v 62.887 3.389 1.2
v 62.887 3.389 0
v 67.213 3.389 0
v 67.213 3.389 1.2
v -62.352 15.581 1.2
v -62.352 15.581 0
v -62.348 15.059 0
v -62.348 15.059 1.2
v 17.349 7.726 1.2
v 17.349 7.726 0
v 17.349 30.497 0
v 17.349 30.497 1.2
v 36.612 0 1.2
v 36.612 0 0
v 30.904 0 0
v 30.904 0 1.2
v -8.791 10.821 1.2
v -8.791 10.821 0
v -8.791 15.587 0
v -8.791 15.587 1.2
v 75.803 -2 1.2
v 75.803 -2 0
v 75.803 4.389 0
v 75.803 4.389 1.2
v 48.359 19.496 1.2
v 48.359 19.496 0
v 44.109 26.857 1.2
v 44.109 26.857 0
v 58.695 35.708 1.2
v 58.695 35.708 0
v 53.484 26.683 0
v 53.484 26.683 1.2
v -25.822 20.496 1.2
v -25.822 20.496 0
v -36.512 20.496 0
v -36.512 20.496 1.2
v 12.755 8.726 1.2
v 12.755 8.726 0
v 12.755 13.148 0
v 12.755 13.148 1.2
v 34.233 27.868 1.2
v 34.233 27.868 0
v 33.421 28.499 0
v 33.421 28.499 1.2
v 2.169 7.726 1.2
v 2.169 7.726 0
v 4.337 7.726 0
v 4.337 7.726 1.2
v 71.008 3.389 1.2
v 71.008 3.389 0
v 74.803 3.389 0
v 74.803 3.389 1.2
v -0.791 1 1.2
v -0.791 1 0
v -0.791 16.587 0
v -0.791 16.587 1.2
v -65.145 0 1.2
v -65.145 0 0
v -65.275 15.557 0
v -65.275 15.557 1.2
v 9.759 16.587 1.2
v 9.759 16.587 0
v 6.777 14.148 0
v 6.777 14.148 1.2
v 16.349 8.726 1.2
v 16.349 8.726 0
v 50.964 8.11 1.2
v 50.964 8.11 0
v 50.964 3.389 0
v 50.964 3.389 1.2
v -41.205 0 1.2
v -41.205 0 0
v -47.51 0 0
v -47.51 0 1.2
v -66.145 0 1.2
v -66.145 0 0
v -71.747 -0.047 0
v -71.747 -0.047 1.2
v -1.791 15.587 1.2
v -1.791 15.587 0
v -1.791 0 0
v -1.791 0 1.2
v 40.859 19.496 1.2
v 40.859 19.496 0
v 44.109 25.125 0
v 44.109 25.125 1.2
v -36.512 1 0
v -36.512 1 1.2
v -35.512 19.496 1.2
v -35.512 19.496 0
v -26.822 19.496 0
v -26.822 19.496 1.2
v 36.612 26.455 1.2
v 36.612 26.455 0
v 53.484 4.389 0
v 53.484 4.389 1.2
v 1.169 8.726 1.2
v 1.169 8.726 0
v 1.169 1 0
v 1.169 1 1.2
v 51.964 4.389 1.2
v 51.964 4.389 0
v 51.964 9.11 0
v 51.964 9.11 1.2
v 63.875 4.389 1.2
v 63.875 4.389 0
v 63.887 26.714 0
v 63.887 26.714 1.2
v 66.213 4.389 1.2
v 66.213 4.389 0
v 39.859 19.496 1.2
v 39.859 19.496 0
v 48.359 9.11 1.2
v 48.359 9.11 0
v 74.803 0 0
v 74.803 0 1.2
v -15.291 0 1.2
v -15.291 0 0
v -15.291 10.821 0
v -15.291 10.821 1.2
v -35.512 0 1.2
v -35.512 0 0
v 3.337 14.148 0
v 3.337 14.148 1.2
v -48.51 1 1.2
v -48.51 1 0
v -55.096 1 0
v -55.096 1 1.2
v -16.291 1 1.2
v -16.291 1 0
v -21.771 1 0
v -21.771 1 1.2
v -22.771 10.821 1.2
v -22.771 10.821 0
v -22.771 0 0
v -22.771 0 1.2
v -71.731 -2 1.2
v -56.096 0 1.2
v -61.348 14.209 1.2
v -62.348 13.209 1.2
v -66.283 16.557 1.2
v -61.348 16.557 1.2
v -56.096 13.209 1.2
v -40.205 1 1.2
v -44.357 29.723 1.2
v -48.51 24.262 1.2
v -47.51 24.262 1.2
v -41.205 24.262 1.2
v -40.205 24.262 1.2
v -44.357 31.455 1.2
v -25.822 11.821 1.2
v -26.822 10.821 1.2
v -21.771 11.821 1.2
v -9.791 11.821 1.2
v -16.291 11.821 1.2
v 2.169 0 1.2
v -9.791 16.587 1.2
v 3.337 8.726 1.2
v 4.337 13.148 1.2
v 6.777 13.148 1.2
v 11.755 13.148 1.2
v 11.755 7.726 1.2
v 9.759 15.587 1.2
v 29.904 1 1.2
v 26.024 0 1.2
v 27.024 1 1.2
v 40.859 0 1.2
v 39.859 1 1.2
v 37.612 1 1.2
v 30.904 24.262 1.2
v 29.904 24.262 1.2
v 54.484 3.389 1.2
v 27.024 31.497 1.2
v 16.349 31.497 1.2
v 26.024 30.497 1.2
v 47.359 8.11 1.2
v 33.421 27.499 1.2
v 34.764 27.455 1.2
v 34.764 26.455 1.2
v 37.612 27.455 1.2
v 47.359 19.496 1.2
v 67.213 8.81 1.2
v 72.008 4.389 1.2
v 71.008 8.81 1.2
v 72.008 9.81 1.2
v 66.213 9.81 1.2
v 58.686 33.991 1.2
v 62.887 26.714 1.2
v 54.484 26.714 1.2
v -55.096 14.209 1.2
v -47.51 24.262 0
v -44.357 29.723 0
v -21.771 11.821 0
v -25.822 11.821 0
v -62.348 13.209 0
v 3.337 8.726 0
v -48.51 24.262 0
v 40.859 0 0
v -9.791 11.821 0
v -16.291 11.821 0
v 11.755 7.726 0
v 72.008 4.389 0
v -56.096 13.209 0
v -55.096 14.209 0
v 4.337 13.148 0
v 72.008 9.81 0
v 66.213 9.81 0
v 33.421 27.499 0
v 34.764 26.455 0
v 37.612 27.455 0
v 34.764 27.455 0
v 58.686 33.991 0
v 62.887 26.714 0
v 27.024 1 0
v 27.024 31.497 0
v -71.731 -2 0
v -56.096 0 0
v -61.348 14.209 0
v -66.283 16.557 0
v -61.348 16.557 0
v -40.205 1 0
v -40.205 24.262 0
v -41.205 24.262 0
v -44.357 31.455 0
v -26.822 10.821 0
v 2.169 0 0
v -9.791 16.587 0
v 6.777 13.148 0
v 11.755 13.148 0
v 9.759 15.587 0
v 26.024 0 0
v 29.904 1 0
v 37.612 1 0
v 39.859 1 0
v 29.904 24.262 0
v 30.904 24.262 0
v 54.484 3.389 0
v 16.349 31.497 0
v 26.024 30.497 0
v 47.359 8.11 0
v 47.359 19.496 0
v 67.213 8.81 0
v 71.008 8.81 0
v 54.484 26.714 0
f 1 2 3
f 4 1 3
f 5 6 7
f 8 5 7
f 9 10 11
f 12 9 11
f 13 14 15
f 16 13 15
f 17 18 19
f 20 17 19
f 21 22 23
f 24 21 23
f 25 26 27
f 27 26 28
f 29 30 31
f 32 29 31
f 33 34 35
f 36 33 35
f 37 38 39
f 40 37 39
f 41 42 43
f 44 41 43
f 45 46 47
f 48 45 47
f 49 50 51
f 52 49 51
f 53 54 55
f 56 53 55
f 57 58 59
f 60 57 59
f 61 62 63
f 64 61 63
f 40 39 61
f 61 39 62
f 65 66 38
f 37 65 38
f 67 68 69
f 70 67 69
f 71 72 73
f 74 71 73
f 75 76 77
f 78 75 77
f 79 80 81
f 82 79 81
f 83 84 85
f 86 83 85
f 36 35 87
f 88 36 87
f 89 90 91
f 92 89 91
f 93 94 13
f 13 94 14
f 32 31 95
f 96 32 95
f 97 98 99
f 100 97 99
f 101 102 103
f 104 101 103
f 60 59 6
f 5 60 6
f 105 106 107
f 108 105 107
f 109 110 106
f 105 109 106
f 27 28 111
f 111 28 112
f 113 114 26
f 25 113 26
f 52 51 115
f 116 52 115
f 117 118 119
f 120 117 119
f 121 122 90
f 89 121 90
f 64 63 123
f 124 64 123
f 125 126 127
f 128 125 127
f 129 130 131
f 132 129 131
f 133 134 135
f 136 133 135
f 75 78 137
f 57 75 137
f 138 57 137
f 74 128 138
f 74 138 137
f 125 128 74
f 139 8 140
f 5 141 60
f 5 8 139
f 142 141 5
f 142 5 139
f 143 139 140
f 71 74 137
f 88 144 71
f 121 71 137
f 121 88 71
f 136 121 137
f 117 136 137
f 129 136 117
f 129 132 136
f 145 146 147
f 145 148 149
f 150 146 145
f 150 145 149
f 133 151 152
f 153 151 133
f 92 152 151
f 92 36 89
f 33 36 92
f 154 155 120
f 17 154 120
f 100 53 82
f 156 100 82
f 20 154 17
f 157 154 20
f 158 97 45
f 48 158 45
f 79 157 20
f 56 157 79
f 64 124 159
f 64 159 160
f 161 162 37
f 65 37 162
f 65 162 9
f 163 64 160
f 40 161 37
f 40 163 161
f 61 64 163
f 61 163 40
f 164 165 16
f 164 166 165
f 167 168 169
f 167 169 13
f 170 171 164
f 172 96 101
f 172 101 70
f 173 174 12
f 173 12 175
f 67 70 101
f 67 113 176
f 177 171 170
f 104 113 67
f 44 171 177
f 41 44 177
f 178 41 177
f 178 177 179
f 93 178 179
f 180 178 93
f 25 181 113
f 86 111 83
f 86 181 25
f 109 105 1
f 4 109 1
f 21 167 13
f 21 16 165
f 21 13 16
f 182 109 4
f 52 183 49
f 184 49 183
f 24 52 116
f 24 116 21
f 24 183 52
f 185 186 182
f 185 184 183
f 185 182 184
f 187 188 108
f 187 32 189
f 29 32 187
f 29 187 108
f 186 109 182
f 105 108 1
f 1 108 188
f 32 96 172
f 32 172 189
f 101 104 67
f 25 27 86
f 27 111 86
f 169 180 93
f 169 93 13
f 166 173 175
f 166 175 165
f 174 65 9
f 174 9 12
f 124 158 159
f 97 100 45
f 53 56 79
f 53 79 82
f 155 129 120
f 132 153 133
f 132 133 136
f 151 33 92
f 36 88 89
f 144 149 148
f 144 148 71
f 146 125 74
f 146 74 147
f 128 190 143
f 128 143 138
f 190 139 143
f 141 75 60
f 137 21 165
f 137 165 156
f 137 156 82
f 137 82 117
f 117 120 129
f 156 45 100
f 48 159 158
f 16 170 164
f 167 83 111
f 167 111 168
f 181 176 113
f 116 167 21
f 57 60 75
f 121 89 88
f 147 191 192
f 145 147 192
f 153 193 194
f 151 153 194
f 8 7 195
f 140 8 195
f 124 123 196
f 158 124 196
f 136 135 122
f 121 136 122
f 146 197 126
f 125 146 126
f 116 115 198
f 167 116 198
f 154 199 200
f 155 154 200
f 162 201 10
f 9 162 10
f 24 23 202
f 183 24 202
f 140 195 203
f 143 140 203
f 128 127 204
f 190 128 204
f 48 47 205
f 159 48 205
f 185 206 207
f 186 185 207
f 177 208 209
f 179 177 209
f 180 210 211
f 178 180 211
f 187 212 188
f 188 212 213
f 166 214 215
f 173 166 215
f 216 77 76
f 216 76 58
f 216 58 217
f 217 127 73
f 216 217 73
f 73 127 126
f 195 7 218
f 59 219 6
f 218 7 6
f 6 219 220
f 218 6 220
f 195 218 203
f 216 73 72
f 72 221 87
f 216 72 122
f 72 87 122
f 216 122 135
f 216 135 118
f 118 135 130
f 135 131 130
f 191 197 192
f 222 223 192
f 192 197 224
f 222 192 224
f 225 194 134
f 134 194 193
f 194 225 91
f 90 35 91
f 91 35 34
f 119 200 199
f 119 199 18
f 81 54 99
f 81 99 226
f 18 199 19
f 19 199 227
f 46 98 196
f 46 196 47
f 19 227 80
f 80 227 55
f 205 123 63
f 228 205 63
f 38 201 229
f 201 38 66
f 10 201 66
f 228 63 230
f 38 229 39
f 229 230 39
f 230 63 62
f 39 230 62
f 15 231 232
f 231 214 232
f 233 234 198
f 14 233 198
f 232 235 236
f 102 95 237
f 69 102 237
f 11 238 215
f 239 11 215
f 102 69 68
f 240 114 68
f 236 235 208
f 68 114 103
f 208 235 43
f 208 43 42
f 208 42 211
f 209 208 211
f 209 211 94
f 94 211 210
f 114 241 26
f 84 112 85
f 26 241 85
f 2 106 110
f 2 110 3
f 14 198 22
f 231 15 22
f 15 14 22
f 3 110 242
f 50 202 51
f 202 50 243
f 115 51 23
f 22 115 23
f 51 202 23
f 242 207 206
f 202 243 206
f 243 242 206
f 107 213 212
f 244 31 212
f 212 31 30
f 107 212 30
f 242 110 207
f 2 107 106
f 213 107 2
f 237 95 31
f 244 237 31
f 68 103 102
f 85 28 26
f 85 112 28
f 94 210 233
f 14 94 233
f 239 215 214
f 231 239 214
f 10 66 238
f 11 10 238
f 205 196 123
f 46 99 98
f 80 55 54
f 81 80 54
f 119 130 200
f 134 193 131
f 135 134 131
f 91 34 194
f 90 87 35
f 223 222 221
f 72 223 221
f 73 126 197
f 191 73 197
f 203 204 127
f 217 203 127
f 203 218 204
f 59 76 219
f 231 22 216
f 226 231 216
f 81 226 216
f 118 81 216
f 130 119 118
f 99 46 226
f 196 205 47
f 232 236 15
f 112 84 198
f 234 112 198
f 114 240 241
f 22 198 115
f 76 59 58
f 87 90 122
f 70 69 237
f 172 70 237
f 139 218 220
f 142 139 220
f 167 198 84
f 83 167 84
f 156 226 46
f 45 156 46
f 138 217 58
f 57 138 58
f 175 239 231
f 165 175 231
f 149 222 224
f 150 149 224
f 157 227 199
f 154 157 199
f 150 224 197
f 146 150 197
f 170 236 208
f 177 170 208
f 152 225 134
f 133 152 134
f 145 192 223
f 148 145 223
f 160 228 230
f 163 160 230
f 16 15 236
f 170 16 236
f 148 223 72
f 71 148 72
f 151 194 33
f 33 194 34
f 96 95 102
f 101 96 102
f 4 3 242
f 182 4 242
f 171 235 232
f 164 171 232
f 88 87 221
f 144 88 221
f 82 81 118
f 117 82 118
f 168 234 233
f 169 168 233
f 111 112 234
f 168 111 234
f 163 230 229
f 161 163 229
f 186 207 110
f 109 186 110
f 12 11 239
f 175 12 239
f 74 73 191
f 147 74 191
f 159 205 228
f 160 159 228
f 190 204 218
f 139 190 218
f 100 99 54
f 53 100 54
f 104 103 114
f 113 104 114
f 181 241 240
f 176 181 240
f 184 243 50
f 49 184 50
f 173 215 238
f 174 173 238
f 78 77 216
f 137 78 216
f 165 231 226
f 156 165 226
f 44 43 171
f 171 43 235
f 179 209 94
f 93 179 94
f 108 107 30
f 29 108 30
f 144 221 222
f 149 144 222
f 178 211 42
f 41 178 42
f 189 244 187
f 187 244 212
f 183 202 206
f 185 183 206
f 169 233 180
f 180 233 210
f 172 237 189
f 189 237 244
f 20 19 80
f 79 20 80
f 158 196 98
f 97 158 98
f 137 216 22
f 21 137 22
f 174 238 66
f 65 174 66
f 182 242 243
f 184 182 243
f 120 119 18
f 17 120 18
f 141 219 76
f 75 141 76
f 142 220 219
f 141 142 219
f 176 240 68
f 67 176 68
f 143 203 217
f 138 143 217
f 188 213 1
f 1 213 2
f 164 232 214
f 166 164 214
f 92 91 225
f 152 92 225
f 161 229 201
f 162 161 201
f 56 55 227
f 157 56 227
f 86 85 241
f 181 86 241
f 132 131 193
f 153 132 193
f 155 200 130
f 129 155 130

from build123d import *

# Parameters (mm, degrees)
F1_DEPTH = 1.2


with BuildPart() as f1:
    # F0 (on Top) → F1 (new body)
    with BuildSketch(Plane.XY):
        Polygon((-8.791217, 10.820824), (-8.791217, 15.58735), (-1.791217, 15.58735), (-1.791217, 0), (0, 0), (2.168675, 0), (2.168675, 7.725904), (4.33735, 7.725904), (4.33735, 13.147592), (6.77711, 13.147592), (9.759036, 15.58735), (11.755203, 13.147592), (11.755203, 7.725904), (17.3494, 7.725904), (17.3494, 30.496988), (26.024099, 30.496988), (26.024099, 7.725904), (26.024099, 0), (30.903617, 0), (30.903617, 19.495524), (30.903617, 24.262048), (33.421363, 27.499158), (34.764209, 26.454724), (36.612159, 26.454724), (36.612159, 24.262048), (36.612159, 0), (40.858796, 0), (40.858796, 19.495524), (44.108796, 25.124689), (47.358796, 19.495524), (47.358796, 8.10998), (50.963856, 8.10998), (50.963856, 3.388554), (54.483884, 3.388554), (54.483884, 26.713658), (58.685689, 33.991398), (62.887494, 26.713658), (62.887494, 3.388554), (67.212614, 3.388554), (67.212614, 8.810241), (71.00779, 8.810241), (71.00779, 3.388554), (74.802975, 3.388554), (74.802975, 0), (75.802975, 0), (75.802975, 4.388554), (74.802975, 4.388554), (72.00779, 4.388554), (72.00779, 9.810241), (68.572836, 9.810241), (66.212614, 9.810241), (66.212614, 6.689354), (66.212614, 4.388554), (64.699309, 4.388554), (63.875258, 4.388554), (63.887494, 26.713658), (58.694566, 35.708074), (53.483884, 26.682909), (53.483884, 4.388554), (51.963856, 4.388554), (51.963856, 9.10998), (48.358796, 9.10998), (48.358796, 19.495524), (44.108796, 26.85674), (39.858796, 19.495524), (39.858796, 1), (37.612159, 1), (37.612159, 27.454724), (34.764209, 27.454724), (34.232993, 27.867891), (33.421363, 28.499158), (29.903617, 24.262048), (29.903617, 1), (27.024099, 1), (27.024099, 31.496988), (16.3494, 31.496988), (16.3494, 8.725904), (12.755203, 8.725904), (12.755203, 13.147592), (9.759036, 16.58735), (6.77711, 14.147592), (4.33735, 14.147592), (3.33735, 14.147592), (3.33735, 8.725904), (1.168675, 8.725904), (1.168675, 1), (-0.791217, 1), (-0.791217, 16.58735), (-9.791217, 16.58735), (-9.791217, 11.820824), (-16.291217, 11.820824), (-16.291217, 1), (-21.771085, 1), (-21.771085, 11.820824), (-25.821578, 11.820824), (-25.821578, 20.495524), (-30.47494, 20.495524), (-36.512049, 20.495524), (-36.512049, 1), (-40.204821, 1), (-40.204821, 24.262048), (-44.357452, 31.454616), (-48.510083, 24.262048), (-48.510083, 1), (-55.096389, 1), (-55.096389, 14.208821), (-61.347563, 14.208821), (-61.347563, 16.556969), (-66.283464, 16.556969), (-66.144578, 0), (-65.144543, 0), (-65.275041, 15.556969), (-62.351945, 15.581489), (-62.347563, 15.059114), (-62.347563, 13.208821), (-56.096389, 13.208821), (-56.096389, 0), (-51.847431, 0), (-47.510083, 0), (-47.510083, 24.262048), (-44.357452, 29.722565), (-41.204821, 24.262048), (-41.204821, 0), (-35.512049, 0), (-35.512049, 19.495524), (-26.821578, 19.495524), (-26.821578, 10.820824), (-22.771085, 10.820824), (-22.771085, 0), (-17.891567, 0), (-15.291217, 0), (-15.291217, 1), (-15.291217, 10.820824), align=None)
        Polygon((0, 0), (-1.791217, 0), (-15.291217, 0), (-17.891567, 0), (-22.771085, 0), (-35.512049, 0), (-41.204821, 0), (-47.510083, 0), (-51.847431, 0), (-56.096389, 0), (-65.144543, 0), (-66.144578, 0), (-71.747227, -0.046997), (-71.730845, -2), (74.802975, -2), (75.802975, -2), (75.802975, 0), (74.802975, 0), (40.858796, 0), (36.612159, 0), (30.903617, 0), (26.024099, 0), (2.168675, 0), align=None)
    extrude(amount=F1_DEPTH)


solid = f1.part
